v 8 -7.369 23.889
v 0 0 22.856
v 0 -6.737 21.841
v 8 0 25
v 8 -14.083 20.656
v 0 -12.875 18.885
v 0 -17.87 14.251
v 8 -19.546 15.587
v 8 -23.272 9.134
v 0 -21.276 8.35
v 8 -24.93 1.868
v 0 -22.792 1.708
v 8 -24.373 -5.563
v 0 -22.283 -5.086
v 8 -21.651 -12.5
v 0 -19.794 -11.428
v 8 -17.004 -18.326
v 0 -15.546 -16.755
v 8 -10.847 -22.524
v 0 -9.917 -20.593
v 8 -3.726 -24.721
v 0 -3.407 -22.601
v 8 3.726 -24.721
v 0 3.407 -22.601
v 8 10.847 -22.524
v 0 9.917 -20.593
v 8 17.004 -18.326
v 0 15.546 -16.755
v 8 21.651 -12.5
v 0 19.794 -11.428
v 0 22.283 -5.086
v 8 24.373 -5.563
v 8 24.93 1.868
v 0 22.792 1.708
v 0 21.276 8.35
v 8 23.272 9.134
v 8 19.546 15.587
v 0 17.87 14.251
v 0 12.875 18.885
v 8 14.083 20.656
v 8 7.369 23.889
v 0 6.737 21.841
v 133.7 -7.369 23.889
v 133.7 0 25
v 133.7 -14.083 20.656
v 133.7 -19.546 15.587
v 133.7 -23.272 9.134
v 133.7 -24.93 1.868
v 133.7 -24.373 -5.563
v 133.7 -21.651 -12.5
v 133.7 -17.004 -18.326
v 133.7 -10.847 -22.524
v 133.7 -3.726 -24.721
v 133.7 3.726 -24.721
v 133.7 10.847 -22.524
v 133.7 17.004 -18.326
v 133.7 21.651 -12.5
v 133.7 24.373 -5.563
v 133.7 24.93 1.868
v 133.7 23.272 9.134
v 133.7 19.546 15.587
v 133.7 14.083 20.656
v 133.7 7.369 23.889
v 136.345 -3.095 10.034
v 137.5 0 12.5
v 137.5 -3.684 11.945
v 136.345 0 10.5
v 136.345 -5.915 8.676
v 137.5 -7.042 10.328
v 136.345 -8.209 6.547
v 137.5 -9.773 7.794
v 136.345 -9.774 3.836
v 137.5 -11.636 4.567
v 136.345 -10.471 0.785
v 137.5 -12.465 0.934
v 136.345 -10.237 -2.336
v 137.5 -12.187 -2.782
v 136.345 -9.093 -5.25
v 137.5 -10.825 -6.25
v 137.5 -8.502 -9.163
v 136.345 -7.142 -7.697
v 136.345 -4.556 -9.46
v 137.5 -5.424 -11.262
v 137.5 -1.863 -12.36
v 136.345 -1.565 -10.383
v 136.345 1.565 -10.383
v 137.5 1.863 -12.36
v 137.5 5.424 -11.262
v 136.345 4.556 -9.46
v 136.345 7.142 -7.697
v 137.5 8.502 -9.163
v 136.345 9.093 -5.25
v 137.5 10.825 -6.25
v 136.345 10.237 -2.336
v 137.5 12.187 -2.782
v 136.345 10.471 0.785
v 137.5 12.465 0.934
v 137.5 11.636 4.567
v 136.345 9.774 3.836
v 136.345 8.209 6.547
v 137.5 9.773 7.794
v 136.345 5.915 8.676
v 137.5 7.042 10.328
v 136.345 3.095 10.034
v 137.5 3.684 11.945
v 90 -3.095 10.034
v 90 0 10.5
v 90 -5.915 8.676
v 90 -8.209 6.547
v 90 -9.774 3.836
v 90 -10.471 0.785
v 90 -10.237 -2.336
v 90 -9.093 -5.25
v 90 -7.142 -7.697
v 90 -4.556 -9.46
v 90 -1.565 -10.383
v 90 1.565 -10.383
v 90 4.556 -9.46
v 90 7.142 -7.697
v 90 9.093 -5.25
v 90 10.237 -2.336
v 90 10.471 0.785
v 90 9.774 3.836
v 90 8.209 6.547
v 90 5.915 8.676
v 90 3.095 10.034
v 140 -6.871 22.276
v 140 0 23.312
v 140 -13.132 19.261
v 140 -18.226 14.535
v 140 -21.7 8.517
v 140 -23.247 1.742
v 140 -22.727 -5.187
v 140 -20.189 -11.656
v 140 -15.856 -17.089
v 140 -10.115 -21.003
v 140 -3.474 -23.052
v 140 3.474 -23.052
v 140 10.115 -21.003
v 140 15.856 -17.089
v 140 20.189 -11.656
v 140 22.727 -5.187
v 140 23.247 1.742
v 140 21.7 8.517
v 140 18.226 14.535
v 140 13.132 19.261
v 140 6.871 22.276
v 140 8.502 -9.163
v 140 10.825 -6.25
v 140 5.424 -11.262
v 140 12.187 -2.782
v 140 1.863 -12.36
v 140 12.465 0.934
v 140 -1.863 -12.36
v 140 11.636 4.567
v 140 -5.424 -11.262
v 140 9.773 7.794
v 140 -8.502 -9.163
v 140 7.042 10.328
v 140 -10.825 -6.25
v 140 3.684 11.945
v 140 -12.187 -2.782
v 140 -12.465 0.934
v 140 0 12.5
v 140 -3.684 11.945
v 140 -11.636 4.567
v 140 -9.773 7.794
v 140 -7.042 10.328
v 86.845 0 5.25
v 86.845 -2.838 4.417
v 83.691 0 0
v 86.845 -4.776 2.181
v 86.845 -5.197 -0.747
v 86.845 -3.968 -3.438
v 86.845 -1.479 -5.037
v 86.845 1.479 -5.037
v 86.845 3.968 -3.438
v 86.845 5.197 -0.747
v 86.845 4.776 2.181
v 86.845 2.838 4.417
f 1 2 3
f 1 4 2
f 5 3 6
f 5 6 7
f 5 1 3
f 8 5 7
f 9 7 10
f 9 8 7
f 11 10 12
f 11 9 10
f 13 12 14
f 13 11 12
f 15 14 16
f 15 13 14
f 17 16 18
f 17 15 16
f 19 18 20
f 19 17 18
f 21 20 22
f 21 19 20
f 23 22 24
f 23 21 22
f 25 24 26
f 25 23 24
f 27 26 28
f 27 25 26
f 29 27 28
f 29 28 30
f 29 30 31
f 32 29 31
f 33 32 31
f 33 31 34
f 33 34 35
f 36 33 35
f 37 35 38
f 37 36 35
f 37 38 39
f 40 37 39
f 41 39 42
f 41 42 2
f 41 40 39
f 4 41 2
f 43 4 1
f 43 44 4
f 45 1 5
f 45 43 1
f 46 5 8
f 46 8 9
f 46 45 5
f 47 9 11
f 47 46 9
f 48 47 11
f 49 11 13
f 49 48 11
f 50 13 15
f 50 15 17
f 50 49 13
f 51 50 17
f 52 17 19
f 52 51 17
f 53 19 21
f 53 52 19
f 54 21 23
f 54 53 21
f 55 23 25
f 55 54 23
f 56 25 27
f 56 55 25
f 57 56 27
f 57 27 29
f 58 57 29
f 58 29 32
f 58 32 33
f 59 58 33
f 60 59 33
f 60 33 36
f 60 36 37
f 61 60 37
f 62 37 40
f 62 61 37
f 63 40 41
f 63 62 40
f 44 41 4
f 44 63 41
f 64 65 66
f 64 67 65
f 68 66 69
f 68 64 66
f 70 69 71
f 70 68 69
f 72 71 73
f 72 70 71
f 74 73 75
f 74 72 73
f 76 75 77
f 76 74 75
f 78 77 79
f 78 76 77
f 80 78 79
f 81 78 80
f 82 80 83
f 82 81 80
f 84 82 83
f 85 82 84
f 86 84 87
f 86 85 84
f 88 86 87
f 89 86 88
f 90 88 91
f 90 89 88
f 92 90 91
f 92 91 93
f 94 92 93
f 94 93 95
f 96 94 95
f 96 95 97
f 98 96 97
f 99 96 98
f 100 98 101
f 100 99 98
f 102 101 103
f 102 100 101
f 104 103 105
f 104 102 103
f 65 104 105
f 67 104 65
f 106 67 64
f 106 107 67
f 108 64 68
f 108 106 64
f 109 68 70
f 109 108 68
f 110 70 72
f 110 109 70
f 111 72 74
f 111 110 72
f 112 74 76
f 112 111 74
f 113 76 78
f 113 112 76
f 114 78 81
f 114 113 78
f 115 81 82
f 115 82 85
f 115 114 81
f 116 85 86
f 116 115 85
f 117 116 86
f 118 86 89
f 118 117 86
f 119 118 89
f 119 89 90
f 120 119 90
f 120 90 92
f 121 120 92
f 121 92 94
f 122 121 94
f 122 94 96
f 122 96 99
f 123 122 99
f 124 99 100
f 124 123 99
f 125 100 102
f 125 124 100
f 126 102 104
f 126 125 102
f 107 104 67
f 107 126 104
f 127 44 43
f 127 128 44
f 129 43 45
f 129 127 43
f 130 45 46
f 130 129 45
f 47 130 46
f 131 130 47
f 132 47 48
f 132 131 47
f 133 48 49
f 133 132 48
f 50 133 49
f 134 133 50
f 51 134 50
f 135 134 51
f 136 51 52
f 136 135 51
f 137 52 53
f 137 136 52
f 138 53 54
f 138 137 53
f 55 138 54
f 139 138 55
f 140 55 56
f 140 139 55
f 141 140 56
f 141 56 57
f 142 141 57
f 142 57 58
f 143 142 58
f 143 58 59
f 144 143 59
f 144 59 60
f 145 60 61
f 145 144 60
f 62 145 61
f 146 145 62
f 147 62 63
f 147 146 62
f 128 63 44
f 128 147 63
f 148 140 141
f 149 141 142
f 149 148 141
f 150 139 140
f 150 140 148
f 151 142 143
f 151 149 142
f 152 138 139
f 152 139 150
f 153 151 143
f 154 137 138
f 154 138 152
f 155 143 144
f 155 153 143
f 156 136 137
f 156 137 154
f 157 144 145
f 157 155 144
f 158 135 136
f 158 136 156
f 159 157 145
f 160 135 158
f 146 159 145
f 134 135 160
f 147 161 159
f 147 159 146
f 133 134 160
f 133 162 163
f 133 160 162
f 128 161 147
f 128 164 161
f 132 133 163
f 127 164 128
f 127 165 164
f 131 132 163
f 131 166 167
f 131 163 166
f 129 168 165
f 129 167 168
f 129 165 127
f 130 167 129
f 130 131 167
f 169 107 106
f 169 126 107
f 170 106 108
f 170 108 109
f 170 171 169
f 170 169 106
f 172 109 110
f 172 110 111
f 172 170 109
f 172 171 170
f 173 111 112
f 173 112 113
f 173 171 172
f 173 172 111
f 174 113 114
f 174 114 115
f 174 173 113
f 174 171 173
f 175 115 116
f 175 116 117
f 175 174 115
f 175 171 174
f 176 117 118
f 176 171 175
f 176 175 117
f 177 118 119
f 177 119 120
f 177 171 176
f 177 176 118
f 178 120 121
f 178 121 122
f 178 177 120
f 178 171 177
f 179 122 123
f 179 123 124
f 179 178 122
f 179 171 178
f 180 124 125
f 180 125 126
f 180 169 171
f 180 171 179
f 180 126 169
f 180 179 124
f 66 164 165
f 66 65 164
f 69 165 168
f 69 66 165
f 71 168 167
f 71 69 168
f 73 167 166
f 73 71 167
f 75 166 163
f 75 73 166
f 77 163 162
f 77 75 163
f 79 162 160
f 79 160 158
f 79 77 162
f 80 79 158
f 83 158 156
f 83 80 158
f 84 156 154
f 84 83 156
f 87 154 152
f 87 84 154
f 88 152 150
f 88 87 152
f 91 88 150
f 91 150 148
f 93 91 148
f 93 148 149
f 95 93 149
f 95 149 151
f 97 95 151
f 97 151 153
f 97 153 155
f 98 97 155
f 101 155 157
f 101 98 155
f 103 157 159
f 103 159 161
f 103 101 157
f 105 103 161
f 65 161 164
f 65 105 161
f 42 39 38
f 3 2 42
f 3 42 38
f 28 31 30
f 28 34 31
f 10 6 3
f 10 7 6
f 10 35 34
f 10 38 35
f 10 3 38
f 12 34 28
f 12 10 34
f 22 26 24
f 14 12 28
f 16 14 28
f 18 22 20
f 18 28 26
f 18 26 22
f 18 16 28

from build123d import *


with BuildPart() as part:
    # Sketch1 → Base-Revolve (revolve)
    with BuildSketch(Plane.XY, mode=Mode.PRIVATE) as base_revolve_sk:
        Polygon((0, 0), (0, 22.856406461), (8, 25), (133.7, 25), (140, 23.311920088), (140, 12.5), (137.5, 12.5), (136.345299462, 10.5), (90, 10.5), (83.6909635, 0), align=None)
    revolve(base_revolve_sk.sketch.rotate(Axis((-10, 0, 0), (1, 0, 0)), 90), axis=Axis((-10, 0, 0), (1, 0, 0)))


solid = part.part
